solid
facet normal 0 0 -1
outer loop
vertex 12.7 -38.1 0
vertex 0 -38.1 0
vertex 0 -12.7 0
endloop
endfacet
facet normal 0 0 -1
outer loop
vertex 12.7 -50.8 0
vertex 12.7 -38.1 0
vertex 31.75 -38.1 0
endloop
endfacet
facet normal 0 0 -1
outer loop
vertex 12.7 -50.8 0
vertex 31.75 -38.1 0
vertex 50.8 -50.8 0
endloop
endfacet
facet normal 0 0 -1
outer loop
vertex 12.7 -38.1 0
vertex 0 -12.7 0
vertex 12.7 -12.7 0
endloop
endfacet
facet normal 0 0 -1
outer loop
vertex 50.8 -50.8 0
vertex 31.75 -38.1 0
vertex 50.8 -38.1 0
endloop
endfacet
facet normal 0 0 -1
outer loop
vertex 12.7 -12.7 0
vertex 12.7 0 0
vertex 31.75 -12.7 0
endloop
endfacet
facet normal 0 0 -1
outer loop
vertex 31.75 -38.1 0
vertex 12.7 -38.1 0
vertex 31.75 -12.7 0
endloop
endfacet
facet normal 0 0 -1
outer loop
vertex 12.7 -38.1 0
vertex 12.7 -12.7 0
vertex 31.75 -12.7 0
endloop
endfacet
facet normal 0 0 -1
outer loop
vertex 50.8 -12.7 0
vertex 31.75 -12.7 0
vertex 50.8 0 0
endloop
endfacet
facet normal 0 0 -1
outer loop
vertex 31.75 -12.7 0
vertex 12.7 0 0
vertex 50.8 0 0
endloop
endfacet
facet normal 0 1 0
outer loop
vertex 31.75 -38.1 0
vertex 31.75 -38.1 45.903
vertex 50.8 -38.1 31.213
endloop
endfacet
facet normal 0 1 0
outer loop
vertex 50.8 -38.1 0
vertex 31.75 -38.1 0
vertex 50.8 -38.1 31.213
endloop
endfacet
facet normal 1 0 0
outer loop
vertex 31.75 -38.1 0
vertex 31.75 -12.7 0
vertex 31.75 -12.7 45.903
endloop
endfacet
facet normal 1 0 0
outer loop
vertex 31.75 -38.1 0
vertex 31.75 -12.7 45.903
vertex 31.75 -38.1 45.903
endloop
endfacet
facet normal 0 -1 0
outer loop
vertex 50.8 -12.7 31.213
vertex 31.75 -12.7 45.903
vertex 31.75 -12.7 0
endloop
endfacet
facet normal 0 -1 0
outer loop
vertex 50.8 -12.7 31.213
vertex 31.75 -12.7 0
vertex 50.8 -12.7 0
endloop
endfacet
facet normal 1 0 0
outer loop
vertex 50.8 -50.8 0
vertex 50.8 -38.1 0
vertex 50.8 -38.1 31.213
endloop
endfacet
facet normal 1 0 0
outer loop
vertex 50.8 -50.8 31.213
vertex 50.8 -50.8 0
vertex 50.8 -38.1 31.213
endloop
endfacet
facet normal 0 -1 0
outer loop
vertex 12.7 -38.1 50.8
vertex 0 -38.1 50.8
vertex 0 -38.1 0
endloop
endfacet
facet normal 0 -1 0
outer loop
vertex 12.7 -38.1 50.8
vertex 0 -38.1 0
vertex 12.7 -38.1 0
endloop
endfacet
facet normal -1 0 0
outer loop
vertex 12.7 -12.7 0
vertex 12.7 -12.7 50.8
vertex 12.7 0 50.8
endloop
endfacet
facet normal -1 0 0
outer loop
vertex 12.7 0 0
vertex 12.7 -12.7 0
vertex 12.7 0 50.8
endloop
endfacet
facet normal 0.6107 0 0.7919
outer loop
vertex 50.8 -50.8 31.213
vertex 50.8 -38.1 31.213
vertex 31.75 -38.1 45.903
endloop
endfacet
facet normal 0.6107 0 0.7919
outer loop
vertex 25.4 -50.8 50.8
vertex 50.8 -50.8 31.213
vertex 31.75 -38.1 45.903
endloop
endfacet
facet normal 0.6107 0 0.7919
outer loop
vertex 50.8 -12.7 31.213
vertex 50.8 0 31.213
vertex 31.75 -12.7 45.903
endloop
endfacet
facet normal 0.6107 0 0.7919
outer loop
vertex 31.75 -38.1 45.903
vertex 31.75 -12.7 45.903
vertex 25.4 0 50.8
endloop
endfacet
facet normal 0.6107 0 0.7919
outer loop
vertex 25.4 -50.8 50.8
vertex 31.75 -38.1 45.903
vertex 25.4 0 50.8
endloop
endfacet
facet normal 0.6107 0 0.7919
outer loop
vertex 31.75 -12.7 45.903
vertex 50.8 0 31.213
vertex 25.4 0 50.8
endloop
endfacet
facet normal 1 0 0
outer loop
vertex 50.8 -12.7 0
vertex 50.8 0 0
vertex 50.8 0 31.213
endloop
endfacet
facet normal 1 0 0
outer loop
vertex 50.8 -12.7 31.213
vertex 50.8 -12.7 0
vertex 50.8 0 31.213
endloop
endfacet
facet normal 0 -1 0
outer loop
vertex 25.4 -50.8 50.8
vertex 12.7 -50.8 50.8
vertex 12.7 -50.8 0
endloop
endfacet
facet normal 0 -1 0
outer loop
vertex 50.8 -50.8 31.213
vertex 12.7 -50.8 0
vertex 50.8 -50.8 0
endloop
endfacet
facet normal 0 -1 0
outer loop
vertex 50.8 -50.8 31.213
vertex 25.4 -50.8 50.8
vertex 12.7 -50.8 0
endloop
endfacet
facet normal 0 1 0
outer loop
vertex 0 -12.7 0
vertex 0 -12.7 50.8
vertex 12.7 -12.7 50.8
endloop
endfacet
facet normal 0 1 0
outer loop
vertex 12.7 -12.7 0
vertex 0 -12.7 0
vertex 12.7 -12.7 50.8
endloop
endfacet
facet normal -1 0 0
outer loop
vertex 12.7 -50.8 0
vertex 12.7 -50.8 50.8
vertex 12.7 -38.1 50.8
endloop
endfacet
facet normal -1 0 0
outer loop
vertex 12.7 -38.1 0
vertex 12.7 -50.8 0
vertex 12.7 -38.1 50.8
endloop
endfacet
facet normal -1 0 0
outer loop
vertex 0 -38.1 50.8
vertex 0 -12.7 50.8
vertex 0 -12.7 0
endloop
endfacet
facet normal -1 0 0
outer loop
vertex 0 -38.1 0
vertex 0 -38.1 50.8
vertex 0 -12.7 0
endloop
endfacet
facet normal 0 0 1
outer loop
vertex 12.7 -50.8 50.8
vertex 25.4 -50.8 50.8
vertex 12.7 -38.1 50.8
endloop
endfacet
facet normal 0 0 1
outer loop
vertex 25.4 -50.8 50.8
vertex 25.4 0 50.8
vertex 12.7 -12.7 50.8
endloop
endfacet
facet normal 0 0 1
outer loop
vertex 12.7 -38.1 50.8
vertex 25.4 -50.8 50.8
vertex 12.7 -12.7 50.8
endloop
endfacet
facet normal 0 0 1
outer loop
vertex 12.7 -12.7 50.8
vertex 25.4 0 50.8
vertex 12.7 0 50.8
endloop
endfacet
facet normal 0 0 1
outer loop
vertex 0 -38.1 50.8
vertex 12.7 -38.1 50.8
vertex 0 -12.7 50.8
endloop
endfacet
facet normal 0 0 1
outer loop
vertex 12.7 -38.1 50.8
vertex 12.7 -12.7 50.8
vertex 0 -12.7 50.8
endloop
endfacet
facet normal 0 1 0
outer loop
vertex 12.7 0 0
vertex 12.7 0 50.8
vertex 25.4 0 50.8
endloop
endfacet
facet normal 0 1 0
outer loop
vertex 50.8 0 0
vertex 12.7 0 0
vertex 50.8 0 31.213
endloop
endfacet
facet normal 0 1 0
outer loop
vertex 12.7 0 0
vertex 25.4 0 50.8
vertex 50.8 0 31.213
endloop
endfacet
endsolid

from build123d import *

# Parameters (mm, degrees)
F1_DEPTH = 50.8
F2_W     = 12.7
F2_H     = 12.7
F3_DEPTH = 50.801
F4_W     = 19.05
F4_H     = 25.4
F5_DEPTH = 50.801


with BuildPart() as f1:
    # F0 (on Front) → F1 (new body)
    with BuildSketch(Plane.XZ):
        Polygon((25.4, 50.8), (0, 50.8), (0, 0), (50.8, 0), (50.8, 31.212713), align=None)
    extrude(amount=F1_DEPTH)

    # F2 (on face) → F3 (cut, through all)
    with BuildSketch(Plane.XY.offset(50.8)):
        with Locations((6.35, -6.35)):
            Rectangle(F2_W, F2_H)
        with Locations((6.35, -44.45)):
            Rectangle(F2_W, F2_H)
    extrude(amount=-F3_DEPTH, mode=Mode.SUBTRACT)

    # F4 (on face) → F5 (cut, through all)
    with BuildSketch(Plane(origin=(0, 0, 0), x_dir=(1, 0, 0), z_dir=(0, 0, -1))):
        with Locations((41.275, 25.4)):
            Rectangle(F4_W, F4_H)
    extrude(amount=-F5_DEPTH, mode=Mode.SUBTRACT)


solid = f1.part
